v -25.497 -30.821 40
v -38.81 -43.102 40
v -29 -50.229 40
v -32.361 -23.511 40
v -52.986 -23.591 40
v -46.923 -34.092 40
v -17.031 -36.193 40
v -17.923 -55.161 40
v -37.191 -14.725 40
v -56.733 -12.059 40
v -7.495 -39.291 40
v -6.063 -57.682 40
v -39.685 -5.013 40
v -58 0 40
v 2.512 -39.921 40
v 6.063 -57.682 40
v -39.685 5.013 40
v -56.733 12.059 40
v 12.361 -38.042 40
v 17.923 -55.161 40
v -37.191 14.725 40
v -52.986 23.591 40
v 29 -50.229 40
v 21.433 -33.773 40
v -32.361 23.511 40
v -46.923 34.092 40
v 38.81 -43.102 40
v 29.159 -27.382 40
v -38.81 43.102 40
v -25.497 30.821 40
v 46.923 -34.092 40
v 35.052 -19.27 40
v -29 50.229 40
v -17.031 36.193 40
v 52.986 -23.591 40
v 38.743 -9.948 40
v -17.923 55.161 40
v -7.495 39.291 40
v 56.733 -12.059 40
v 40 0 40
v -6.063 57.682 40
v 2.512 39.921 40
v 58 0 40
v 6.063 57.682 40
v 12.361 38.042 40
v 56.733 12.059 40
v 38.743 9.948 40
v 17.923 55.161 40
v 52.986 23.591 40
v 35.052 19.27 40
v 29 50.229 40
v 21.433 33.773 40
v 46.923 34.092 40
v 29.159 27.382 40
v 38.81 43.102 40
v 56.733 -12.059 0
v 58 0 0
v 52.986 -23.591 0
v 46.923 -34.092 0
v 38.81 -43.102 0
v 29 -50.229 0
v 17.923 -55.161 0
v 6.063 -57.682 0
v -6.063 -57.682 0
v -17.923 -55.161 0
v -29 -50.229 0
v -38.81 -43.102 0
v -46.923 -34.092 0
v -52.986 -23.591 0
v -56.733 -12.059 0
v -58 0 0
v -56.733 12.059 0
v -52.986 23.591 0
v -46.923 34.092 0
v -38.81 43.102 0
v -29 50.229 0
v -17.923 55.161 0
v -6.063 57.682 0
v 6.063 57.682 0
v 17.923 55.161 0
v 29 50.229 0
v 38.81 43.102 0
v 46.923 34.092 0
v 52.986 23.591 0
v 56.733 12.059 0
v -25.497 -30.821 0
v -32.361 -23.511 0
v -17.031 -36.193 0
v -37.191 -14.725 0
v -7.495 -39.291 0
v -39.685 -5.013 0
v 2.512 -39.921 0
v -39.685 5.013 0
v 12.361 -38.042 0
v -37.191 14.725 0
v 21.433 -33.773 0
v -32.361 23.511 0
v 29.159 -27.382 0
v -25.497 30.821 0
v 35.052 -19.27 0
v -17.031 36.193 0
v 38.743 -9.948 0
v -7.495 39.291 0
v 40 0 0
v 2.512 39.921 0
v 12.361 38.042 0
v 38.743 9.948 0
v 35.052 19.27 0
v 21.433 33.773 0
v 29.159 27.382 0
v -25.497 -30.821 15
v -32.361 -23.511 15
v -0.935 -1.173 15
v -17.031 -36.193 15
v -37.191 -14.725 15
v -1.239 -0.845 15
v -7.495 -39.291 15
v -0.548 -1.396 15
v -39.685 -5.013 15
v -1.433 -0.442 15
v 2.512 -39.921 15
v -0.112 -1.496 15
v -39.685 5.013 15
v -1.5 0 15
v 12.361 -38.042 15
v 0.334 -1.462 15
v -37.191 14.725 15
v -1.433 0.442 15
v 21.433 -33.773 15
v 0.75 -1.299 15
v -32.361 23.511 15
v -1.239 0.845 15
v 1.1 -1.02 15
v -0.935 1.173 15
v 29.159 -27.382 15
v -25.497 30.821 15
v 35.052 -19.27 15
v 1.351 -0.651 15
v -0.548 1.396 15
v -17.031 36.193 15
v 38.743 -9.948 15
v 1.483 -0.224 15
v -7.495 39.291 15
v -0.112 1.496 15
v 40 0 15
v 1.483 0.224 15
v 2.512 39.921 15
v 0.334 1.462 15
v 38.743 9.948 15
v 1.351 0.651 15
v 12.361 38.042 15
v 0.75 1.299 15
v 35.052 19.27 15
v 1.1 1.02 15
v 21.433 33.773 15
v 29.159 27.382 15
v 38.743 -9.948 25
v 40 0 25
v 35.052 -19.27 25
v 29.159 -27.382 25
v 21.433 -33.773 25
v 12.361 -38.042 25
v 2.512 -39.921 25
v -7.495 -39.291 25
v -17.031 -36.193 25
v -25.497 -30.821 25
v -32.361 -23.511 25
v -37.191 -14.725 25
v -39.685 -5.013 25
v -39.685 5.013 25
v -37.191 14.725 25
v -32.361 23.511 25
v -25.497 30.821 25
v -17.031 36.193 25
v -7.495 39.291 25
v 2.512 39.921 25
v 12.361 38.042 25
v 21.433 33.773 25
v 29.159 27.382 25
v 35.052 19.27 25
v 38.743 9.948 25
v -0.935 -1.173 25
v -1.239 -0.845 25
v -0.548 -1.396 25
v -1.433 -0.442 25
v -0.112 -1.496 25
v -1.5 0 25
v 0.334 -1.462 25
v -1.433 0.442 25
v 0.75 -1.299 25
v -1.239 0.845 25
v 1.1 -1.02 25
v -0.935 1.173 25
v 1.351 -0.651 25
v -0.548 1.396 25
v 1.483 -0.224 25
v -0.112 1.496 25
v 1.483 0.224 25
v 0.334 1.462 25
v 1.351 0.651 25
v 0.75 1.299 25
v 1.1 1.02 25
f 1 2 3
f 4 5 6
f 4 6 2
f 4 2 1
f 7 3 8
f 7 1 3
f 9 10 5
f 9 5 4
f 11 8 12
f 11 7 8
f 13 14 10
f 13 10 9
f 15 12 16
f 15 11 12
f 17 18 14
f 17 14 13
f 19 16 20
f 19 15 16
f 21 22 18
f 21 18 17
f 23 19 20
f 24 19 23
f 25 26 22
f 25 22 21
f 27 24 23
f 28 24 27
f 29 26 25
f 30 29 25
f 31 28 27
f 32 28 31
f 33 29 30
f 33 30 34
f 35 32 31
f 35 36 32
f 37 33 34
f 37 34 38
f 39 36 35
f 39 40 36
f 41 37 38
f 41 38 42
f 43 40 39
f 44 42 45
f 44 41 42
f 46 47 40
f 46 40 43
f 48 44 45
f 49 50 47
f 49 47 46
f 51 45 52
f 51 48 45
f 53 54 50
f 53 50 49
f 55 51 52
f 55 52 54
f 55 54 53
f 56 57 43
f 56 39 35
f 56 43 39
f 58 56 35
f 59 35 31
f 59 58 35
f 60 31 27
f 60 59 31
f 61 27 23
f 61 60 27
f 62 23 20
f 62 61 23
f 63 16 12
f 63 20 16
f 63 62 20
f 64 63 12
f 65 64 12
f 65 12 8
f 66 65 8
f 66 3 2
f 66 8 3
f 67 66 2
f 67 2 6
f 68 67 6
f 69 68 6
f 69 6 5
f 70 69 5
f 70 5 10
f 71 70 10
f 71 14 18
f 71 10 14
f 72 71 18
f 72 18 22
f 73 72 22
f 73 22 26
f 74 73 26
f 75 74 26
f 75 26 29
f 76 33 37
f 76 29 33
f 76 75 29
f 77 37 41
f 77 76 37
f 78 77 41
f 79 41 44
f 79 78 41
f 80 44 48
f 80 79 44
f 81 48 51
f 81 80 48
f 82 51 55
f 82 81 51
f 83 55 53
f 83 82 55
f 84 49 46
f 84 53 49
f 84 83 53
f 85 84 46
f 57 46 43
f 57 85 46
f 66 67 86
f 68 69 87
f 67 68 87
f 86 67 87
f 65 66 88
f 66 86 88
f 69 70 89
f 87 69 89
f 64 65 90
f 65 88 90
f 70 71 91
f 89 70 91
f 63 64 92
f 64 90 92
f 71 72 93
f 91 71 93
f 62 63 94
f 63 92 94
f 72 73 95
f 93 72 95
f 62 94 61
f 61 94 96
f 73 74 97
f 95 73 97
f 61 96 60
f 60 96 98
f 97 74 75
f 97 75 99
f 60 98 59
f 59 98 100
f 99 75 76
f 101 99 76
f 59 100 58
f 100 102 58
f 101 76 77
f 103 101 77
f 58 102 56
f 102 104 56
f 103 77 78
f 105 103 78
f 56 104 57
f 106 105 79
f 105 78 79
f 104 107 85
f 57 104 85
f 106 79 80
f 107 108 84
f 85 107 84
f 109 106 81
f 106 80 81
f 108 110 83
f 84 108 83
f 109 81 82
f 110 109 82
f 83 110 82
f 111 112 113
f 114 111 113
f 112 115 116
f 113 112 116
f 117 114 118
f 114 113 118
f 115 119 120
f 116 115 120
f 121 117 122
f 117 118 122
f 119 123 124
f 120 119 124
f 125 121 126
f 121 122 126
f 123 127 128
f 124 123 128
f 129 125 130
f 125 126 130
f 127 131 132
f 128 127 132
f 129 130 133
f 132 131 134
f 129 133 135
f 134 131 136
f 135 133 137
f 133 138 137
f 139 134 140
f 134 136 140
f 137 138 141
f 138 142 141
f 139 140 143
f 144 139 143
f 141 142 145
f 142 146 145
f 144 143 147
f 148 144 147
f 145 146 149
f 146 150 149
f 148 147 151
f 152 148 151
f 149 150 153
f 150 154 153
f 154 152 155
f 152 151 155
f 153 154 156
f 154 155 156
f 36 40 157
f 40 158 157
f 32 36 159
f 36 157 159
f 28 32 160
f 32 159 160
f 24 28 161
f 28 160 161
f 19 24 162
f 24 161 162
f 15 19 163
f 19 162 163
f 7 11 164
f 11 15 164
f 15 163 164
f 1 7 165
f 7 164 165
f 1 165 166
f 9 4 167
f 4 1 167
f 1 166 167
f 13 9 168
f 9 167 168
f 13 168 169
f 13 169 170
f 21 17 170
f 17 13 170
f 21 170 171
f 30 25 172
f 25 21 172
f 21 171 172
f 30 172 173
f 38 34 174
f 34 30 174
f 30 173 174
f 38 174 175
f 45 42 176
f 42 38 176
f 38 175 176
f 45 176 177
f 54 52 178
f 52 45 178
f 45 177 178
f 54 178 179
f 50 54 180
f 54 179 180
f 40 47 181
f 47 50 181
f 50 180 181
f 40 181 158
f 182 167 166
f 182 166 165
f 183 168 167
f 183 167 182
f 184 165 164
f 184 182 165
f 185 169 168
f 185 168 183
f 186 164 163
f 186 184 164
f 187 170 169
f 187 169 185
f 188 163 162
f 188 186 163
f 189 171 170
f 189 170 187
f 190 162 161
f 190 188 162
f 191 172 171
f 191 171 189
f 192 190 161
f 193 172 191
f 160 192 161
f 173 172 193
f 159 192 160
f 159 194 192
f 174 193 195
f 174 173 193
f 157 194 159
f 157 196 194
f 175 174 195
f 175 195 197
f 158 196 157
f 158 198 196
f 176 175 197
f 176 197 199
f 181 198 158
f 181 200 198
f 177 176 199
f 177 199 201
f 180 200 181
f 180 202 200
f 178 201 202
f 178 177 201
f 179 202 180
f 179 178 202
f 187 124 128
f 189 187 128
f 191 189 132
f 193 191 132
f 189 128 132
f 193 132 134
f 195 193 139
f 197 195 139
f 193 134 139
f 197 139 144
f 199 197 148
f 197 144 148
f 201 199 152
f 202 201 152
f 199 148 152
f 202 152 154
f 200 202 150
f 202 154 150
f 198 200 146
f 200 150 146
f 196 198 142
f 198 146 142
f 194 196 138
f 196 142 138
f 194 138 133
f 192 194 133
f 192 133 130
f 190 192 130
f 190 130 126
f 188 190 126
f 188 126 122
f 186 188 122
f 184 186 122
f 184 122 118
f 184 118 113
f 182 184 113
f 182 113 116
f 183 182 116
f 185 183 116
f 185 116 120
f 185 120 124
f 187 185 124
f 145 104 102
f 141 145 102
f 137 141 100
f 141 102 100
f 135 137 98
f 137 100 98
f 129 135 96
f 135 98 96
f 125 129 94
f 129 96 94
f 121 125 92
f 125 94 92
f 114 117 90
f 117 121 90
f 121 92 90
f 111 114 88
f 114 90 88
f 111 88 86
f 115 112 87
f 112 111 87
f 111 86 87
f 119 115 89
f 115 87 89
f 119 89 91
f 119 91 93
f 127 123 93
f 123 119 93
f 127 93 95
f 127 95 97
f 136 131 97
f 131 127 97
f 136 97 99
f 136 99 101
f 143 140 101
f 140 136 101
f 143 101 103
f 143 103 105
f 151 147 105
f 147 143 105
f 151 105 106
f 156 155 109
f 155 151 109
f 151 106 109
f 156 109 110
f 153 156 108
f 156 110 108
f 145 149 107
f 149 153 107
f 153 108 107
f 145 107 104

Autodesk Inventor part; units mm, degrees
ref_plane "YZ Plane" through (0, 0, 0) normal (1, 0, 0) x (0, 1, 0)
ref_plane "XZ Plane" through (0, 0, 0) normal (0, 1, 0) x (-1, 0, 0)
sketch "Sketch1" plane through (0, 0, 0) normal (0, 0, 1) x (1, 0, 0)
  circle A0 centre (0, 0) radius 40
  circle A1 centre (0, 0) radius 58
  dimension "d0" = 80
  dimension "d2" = 116
extrude "Extrusion1" add sketch "Sketch1" along normal blind 40
ref_plane "Work Plane1" through (0, 0, 20) normal (0, 0, 1) x (1, 0, 0)
sketch "Sketch2" plane through (0, 0, 20) normal (0, 0, 1) x (1, 0, 0)
  circle A0 centre (0, 0) radius 40
extrude "Extrusion2" add sketch "Sketch2" along normal mid plane 10
sketch "Sketch3" plane through (0, 0, 15) normal (0, 0, -1) x (-1, 0, 0)
  circle A0 centre (0, 0) radius 40 projected
  circle A1 centre (0, 0) radius 1.5
  dimension "d8" = 3
extrude "Extrusion3" cut sketch "Sketch3" against normal through all contours A1
properties part number "roda sim"
